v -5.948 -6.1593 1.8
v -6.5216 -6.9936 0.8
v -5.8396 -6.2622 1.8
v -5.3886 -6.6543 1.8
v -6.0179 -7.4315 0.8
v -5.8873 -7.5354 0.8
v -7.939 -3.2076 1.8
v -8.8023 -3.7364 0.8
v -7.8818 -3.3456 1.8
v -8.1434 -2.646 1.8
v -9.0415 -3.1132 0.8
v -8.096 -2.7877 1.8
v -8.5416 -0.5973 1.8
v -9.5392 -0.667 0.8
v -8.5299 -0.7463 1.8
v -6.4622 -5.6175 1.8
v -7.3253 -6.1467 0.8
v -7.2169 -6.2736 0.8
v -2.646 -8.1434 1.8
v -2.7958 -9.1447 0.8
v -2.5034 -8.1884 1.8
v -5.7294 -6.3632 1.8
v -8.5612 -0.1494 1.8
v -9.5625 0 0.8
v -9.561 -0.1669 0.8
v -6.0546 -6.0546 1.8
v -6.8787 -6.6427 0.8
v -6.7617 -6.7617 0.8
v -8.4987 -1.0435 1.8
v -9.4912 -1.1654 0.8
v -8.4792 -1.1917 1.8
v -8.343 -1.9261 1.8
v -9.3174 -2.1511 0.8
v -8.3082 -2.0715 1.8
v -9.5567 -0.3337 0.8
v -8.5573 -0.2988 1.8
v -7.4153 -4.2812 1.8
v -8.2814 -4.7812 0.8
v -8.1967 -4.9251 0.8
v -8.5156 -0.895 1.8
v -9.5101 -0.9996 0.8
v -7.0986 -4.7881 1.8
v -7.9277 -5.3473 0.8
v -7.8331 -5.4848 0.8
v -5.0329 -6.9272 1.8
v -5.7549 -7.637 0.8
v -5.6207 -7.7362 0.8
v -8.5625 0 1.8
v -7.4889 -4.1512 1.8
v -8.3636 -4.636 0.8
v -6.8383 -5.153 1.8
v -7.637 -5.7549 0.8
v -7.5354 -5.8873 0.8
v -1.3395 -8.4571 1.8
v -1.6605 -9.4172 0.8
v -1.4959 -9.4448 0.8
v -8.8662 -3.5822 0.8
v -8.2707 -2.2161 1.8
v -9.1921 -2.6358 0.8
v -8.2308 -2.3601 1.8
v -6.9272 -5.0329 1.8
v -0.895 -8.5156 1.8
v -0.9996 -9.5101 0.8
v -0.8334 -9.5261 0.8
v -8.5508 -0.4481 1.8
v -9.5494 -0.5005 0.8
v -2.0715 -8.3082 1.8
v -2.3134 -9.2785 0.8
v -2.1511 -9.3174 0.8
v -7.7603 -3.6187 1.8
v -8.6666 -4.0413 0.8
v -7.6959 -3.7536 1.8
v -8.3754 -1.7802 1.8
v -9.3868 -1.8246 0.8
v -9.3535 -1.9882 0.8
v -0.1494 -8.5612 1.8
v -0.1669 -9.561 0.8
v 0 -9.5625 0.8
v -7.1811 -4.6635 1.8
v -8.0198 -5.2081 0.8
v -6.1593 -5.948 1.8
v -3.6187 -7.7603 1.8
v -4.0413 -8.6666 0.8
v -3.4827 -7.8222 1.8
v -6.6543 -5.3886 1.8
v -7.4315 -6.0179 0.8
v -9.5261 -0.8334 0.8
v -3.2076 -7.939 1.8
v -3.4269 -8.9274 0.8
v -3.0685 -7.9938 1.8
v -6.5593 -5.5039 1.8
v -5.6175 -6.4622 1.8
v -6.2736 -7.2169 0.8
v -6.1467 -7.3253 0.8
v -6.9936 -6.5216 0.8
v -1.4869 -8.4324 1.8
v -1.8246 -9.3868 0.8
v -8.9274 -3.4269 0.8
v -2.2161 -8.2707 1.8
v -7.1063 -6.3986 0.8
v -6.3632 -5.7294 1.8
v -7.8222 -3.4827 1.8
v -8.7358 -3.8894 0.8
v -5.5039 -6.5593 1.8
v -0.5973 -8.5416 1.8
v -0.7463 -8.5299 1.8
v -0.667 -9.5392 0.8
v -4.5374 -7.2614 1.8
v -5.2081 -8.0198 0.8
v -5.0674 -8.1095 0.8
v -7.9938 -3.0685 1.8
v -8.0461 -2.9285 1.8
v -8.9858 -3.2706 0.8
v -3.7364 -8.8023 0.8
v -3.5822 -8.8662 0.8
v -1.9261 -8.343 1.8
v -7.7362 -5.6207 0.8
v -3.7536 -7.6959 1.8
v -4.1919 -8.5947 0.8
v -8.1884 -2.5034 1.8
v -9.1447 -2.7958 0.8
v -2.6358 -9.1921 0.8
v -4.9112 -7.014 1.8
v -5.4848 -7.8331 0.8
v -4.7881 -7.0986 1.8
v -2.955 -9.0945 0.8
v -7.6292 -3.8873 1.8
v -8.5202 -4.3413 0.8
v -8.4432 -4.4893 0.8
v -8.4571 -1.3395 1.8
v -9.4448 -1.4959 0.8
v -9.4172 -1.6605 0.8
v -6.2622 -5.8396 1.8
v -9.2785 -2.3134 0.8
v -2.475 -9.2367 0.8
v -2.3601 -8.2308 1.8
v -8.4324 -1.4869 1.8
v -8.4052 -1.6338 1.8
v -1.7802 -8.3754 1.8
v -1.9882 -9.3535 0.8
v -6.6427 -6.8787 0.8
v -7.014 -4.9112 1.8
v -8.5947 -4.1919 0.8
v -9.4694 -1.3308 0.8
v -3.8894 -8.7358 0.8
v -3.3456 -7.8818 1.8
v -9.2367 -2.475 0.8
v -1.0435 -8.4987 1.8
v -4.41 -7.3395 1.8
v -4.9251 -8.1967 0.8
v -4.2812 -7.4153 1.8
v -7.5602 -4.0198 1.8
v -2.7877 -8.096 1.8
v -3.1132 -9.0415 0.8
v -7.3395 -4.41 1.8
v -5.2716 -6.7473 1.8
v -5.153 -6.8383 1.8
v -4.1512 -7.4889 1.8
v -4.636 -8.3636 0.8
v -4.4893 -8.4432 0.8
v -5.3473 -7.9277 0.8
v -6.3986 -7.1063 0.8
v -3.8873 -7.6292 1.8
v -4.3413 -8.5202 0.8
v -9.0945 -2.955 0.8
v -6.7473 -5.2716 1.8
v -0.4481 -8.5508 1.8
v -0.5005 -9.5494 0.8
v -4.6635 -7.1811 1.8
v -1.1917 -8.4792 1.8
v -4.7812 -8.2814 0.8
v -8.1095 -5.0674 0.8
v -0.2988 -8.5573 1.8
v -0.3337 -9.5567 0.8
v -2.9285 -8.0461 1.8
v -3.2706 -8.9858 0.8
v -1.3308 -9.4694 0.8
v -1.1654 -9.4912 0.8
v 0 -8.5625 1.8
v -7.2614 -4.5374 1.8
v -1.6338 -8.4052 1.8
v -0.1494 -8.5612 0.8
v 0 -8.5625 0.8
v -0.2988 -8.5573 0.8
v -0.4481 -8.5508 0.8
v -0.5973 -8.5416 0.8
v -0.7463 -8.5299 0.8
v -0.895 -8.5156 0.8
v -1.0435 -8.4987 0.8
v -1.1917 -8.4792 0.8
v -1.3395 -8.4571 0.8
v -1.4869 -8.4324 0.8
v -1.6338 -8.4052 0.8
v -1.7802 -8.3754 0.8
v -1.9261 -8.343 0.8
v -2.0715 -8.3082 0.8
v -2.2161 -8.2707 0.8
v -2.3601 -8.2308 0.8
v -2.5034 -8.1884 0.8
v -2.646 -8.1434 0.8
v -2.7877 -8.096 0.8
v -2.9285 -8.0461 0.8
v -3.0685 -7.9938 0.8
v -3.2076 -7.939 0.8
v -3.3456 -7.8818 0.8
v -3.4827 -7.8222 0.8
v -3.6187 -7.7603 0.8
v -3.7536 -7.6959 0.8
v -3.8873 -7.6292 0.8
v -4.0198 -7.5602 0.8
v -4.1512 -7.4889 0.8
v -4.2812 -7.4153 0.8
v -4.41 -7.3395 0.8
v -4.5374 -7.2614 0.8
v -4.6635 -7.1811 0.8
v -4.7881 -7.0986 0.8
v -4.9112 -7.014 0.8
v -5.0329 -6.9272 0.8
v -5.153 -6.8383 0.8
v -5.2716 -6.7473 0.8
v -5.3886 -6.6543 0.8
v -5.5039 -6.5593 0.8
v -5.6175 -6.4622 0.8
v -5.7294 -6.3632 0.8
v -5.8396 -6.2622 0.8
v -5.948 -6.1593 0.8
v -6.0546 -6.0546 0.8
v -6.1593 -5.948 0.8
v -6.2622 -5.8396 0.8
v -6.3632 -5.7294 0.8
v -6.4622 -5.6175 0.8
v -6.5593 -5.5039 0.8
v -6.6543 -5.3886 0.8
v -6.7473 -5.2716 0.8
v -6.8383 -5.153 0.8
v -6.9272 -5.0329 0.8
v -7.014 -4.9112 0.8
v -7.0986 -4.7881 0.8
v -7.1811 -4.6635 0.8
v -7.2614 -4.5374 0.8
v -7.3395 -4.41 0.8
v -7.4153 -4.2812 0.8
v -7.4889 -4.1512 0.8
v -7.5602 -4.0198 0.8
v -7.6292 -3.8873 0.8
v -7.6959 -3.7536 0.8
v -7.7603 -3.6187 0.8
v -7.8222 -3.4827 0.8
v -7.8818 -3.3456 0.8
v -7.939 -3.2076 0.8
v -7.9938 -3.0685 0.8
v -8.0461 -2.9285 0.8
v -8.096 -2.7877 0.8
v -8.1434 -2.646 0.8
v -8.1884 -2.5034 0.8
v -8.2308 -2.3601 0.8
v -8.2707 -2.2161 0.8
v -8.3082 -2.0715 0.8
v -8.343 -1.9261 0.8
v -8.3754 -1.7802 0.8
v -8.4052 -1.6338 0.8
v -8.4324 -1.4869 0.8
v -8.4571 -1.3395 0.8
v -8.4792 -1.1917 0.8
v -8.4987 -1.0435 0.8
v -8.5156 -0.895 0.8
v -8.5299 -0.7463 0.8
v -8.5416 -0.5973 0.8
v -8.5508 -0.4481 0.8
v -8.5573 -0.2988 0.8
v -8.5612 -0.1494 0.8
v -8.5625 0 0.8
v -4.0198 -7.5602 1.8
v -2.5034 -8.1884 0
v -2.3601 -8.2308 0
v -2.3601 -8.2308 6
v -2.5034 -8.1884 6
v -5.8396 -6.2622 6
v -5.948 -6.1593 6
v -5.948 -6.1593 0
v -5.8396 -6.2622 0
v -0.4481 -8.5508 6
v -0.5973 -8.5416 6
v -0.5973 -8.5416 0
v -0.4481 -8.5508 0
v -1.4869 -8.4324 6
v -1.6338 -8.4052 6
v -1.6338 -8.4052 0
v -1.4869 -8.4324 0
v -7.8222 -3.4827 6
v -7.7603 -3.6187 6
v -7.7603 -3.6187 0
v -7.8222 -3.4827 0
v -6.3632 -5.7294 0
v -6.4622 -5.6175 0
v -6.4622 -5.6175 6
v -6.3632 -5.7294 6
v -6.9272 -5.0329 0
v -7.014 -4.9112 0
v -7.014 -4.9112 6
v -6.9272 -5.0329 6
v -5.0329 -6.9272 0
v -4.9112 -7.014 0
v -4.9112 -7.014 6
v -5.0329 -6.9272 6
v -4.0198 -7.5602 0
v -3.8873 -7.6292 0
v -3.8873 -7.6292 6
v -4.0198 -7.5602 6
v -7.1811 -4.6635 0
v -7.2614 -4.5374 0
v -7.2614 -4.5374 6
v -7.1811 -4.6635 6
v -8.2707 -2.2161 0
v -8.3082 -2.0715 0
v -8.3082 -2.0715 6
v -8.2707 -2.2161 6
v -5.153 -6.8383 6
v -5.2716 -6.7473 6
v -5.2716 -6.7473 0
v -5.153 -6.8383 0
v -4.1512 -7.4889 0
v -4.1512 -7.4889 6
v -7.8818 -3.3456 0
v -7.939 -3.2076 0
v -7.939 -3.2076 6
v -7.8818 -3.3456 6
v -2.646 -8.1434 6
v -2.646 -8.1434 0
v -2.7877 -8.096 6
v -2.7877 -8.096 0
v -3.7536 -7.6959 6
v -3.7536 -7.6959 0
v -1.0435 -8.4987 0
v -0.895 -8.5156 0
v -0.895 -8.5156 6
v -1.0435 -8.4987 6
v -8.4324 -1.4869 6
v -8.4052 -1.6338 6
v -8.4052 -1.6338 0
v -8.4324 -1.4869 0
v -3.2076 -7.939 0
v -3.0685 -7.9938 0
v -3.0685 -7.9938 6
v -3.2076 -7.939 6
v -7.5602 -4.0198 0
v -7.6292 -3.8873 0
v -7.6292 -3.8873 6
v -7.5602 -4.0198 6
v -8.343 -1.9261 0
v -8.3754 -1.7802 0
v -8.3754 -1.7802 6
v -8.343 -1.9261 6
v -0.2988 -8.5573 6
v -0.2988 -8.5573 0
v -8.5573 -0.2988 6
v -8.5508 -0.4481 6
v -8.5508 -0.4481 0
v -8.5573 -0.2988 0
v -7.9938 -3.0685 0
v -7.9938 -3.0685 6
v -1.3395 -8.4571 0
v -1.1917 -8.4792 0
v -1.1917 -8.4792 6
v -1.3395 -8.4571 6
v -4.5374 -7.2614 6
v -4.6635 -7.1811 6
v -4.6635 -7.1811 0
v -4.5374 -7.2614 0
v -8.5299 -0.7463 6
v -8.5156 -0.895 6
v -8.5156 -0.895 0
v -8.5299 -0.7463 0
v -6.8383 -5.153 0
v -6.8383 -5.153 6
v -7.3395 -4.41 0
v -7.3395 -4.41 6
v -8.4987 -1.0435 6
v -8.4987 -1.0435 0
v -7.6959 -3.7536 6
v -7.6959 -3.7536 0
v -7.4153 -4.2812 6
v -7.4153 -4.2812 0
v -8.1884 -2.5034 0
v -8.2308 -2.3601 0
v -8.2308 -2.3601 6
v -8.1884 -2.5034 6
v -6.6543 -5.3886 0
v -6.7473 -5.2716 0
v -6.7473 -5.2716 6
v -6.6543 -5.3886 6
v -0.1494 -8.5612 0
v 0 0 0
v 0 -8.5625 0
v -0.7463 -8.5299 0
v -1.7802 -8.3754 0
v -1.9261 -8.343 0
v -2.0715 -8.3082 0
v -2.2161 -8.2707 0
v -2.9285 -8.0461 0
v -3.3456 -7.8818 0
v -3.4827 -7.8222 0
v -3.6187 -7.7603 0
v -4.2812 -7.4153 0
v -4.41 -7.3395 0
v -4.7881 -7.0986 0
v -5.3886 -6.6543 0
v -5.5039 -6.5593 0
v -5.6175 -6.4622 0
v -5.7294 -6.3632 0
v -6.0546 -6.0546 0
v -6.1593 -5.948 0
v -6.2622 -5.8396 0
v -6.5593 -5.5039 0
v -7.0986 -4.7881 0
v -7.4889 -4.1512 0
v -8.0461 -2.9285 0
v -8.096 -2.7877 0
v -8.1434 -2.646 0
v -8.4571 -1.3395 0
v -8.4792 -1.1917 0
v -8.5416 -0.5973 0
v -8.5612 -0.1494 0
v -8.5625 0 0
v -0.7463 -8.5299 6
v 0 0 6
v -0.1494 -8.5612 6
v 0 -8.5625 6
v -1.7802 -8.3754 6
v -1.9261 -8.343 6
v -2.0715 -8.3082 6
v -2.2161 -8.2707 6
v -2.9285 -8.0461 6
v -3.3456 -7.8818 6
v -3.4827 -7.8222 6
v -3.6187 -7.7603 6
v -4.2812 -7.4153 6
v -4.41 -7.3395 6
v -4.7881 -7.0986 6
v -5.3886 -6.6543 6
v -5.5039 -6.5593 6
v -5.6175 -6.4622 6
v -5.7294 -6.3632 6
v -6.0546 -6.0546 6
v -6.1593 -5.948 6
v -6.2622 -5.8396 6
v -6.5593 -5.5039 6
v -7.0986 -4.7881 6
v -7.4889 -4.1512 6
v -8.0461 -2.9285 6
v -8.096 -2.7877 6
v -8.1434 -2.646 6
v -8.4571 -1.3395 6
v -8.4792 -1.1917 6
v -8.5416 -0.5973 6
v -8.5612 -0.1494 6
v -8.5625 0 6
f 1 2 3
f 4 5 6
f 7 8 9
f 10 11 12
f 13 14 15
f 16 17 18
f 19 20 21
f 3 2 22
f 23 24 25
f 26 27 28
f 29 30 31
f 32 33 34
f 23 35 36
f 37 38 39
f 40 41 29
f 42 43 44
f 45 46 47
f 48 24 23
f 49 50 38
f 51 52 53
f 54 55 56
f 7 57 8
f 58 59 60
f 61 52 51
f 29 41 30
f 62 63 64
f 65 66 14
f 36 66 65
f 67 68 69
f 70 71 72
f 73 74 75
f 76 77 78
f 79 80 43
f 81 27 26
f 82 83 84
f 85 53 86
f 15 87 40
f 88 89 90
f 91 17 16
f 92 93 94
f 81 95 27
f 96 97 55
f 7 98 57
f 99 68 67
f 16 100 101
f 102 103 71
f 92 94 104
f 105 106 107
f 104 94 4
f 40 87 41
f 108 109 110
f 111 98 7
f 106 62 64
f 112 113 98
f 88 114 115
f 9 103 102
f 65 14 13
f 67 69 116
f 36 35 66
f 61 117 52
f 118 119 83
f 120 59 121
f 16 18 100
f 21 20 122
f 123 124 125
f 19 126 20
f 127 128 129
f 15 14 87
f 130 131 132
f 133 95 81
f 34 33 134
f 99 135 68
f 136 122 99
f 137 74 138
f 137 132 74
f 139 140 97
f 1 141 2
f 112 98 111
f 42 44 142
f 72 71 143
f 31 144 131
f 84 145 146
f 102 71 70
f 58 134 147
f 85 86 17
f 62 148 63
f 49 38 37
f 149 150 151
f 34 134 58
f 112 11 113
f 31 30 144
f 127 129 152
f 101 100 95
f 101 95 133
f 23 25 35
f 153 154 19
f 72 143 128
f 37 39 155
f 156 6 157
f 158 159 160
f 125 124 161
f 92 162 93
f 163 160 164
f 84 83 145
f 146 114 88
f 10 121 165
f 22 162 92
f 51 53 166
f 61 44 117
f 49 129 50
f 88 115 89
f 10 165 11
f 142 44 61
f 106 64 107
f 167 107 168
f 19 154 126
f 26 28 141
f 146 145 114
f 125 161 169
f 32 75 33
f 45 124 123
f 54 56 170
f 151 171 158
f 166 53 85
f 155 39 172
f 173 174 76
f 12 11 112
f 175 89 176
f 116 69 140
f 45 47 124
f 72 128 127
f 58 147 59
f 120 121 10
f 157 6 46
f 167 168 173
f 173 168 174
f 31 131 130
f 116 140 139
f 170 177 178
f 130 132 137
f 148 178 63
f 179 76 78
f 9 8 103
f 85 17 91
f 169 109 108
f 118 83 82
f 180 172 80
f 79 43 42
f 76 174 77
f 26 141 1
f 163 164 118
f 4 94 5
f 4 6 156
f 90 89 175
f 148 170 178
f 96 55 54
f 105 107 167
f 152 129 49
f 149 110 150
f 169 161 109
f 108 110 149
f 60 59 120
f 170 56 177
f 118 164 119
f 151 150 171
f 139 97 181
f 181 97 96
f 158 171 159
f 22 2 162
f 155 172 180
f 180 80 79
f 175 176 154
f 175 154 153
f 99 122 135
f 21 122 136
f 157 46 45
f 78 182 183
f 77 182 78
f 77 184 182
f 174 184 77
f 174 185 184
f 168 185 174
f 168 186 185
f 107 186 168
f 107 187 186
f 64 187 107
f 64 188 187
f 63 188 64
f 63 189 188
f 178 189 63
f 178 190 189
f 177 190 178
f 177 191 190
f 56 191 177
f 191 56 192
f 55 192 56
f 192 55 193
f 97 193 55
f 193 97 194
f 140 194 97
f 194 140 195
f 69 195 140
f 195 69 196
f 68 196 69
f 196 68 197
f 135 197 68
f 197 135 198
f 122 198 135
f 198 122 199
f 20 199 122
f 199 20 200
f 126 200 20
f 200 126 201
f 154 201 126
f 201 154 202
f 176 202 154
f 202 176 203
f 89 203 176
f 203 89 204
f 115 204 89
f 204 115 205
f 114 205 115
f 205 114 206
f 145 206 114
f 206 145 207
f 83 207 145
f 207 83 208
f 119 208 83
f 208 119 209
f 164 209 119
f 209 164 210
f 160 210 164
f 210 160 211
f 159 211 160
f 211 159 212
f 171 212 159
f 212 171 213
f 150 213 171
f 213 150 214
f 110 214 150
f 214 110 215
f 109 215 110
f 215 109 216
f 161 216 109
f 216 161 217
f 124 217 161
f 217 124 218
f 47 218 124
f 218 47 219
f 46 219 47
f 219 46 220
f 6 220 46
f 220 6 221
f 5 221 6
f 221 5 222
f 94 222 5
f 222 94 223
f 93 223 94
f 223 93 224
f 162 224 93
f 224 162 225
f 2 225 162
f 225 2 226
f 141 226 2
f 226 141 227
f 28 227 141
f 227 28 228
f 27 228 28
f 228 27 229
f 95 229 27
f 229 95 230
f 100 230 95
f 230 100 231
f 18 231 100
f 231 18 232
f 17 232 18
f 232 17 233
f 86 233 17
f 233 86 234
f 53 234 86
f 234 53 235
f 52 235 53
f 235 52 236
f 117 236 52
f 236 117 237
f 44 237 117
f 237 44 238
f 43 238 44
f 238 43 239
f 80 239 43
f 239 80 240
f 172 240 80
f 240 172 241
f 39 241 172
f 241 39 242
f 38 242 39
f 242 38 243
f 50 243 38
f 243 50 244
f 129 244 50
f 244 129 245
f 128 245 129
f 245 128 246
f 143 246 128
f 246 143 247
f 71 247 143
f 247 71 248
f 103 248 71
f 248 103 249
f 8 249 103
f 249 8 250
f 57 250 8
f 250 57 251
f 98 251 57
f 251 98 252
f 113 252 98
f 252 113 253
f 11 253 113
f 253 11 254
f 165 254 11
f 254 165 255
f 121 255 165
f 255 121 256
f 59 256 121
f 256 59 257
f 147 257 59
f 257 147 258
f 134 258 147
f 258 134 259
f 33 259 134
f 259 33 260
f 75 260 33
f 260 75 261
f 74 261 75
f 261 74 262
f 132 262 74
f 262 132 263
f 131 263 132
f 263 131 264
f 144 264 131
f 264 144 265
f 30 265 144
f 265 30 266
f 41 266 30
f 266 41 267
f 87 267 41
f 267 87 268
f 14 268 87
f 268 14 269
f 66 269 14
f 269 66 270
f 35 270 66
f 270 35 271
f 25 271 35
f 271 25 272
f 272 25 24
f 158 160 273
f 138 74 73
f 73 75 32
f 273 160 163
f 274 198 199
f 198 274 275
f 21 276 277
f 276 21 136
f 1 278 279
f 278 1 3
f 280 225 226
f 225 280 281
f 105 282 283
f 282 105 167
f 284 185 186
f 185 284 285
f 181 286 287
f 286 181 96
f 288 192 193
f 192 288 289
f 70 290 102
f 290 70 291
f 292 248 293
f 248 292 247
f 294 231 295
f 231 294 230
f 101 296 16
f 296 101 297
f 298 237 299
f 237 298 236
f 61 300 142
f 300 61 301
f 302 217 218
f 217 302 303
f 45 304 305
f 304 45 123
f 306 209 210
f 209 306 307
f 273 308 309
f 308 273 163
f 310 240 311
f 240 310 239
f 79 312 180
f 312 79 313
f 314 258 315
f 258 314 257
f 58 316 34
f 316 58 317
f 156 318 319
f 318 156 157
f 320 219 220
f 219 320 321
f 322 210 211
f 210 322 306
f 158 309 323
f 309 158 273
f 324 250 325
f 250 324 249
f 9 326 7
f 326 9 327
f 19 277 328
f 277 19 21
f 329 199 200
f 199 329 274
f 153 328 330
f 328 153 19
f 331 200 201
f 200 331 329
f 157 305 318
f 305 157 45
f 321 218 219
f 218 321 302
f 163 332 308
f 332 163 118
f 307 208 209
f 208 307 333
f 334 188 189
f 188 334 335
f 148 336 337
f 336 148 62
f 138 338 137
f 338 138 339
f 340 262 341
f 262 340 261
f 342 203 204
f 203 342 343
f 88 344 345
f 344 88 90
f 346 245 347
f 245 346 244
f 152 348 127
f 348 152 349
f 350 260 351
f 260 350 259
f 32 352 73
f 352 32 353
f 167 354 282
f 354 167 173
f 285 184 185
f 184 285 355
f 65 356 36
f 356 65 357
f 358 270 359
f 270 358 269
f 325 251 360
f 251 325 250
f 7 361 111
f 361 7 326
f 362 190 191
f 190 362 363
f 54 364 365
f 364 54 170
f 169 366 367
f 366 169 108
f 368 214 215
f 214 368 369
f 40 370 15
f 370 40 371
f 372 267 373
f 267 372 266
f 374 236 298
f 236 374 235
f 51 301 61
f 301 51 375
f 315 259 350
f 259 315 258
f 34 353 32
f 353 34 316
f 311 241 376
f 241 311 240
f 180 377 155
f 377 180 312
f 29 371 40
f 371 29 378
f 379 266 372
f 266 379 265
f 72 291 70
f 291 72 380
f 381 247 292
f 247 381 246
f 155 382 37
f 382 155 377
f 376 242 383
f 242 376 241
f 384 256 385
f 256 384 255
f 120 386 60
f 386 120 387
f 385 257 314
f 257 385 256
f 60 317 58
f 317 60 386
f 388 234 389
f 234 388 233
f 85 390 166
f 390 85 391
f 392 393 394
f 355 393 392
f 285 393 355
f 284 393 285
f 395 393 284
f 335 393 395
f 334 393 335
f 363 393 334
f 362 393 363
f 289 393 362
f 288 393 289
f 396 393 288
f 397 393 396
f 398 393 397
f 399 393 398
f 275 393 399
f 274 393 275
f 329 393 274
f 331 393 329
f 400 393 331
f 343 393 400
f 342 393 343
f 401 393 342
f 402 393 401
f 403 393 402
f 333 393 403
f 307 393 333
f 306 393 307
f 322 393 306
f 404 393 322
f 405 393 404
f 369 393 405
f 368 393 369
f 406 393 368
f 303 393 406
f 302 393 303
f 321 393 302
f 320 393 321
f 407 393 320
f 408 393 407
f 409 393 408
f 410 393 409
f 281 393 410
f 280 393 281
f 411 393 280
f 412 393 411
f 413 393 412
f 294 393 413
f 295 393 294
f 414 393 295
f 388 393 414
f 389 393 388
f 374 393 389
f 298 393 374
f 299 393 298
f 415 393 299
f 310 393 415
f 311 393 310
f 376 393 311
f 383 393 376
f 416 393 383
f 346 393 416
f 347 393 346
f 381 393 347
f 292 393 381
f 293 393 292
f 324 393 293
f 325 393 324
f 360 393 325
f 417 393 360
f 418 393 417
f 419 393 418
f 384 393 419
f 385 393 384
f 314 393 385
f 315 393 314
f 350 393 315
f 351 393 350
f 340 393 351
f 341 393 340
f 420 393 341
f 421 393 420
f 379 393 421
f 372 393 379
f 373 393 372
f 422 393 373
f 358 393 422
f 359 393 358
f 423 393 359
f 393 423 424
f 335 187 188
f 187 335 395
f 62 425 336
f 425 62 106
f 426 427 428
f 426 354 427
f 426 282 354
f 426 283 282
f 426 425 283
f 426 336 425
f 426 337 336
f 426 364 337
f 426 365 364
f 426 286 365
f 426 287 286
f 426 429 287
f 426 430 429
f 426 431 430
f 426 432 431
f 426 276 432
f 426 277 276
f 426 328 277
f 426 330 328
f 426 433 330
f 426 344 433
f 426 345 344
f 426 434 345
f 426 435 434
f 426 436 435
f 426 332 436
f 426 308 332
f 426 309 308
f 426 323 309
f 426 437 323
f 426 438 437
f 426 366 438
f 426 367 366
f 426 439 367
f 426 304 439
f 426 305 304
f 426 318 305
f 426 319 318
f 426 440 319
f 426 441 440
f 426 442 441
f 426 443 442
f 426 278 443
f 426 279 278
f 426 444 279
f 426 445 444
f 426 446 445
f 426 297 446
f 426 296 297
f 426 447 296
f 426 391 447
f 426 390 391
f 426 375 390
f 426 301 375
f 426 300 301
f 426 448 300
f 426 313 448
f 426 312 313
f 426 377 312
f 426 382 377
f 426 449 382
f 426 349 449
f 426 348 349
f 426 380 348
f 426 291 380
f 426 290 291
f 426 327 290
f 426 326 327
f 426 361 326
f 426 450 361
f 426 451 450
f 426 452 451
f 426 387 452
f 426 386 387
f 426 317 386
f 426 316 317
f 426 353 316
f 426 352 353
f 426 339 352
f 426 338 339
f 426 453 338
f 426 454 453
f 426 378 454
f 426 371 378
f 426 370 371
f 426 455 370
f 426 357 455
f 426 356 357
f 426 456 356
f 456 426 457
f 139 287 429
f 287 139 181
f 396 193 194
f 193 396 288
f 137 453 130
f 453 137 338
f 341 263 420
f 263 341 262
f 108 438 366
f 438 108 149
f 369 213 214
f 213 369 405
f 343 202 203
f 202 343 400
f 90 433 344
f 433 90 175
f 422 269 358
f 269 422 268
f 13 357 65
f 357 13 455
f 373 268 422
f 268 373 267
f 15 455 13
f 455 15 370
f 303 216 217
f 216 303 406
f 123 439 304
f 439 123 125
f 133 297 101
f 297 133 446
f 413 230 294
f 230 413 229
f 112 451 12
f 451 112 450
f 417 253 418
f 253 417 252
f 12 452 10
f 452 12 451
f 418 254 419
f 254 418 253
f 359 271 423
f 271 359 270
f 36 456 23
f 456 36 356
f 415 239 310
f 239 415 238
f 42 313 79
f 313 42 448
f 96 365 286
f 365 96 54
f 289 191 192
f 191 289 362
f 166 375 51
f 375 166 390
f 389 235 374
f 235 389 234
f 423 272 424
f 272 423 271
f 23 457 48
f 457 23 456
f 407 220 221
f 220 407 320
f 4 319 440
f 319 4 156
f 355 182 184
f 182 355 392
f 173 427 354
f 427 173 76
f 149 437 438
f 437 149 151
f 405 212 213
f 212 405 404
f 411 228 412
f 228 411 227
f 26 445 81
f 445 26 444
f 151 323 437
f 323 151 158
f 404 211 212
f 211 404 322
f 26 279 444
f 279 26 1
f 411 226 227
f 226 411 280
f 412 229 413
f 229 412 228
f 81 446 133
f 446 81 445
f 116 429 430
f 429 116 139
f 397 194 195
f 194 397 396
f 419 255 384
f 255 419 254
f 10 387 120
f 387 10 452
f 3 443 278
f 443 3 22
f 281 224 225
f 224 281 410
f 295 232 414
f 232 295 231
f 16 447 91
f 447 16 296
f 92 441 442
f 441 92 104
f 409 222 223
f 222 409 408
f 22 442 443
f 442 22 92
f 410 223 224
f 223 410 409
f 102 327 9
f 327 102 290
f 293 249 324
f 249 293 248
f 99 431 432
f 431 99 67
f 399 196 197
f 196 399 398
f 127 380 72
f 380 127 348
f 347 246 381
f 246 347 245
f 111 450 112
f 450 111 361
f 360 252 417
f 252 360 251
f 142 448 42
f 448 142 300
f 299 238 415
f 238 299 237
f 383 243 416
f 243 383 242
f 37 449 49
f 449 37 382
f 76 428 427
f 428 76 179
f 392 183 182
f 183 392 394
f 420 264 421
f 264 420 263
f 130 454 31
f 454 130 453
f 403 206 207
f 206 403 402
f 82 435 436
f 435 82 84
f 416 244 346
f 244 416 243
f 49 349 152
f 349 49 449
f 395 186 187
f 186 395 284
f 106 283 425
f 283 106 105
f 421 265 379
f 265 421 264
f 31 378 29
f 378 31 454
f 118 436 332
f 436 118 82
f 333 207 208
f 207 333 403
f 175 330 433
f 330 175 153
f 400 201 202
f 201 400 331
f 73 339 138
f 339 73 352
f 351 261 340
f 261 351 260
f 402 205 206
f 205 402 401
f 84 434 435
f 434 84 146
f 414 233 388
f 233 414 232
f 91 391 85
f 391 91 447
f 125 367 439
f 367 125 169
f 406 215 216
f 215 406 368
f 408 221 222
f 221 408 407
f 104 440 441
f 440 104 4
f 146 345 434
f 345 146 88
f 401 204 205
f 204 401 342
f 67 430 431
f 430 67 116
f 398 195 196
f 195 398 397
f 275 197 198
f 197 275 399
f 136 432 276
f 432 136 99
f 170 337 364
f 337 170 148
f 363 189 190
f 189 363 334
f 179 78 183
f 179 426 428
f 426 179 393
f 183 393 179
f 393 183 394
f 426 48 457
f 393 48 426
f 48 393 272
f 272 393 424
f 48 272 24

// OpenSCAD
// The quadrant boss block of bulkhead_flange_positive -- the ring of flange material around
// the longeron, chamfered out into the plate, kept only in the corner quadrant.
//
// Unlike the other ref_*.scad, this one does NOT call a module: the source builds this block
// inline inside bulkhead_flange_positive (fuselage_bulkhead_geometry.scad, the make_web
// branch), so there is nothing to `use`. The code below is a transcription, which means this
// file on its own only checks the port against the transcription. The binding check is the
// assembled bulkhead_flange_positive comparison, which does go through the real module.
//
// Derived parameters for U=1.0 end_bolt 3/16in, make_web = true.
$fa=1;
$fs=0.05;

bulkhead_thickness = 6;
panel_offset = 2.5;
panel_overlap = 4.7625;
panel_tolerance = 0.1;
plate_thickness = 0.8;
flange_thickness = 1.2;
flange_chamfer = 1.0;

intersection() {

    union() {
        translate([0,0,plate_thickness]) {
            cylinder(h=flange_chamfer, r1=panel_tolerance+panel_offset+panel_overlap+flange_thickness+flange_chamfer, r2 = panel_tolerance+panel_offset+panel_overlap+flange_thickness, center=false);
        }
        cylinder(h=bulkhead_thickness, r=panel_tolerance+panel_offset+panel_overlap+flange_thickness, center=false);
    }

    linear_extrude(height=bulkhead_thickness, center=false, convexity=4,twist=0,slices=1,scale=1) {
        polygon([[0,0],[-(panel_tolerance+panel_offset+panel_overlap+flange_thickness+flange_chamfer),0],[-(panel_tolerance+panel_offset+panel_overlap+flange_thickness+flange_chamfer),-(panel_tolerance+panel_offset+panel_overlap+flange_thickness+flange_chamfer)],[0, -(panel_tolerance+panel_offset+panel_overlap+flange_thickness+flange_chamfer)]]);
    }

}
